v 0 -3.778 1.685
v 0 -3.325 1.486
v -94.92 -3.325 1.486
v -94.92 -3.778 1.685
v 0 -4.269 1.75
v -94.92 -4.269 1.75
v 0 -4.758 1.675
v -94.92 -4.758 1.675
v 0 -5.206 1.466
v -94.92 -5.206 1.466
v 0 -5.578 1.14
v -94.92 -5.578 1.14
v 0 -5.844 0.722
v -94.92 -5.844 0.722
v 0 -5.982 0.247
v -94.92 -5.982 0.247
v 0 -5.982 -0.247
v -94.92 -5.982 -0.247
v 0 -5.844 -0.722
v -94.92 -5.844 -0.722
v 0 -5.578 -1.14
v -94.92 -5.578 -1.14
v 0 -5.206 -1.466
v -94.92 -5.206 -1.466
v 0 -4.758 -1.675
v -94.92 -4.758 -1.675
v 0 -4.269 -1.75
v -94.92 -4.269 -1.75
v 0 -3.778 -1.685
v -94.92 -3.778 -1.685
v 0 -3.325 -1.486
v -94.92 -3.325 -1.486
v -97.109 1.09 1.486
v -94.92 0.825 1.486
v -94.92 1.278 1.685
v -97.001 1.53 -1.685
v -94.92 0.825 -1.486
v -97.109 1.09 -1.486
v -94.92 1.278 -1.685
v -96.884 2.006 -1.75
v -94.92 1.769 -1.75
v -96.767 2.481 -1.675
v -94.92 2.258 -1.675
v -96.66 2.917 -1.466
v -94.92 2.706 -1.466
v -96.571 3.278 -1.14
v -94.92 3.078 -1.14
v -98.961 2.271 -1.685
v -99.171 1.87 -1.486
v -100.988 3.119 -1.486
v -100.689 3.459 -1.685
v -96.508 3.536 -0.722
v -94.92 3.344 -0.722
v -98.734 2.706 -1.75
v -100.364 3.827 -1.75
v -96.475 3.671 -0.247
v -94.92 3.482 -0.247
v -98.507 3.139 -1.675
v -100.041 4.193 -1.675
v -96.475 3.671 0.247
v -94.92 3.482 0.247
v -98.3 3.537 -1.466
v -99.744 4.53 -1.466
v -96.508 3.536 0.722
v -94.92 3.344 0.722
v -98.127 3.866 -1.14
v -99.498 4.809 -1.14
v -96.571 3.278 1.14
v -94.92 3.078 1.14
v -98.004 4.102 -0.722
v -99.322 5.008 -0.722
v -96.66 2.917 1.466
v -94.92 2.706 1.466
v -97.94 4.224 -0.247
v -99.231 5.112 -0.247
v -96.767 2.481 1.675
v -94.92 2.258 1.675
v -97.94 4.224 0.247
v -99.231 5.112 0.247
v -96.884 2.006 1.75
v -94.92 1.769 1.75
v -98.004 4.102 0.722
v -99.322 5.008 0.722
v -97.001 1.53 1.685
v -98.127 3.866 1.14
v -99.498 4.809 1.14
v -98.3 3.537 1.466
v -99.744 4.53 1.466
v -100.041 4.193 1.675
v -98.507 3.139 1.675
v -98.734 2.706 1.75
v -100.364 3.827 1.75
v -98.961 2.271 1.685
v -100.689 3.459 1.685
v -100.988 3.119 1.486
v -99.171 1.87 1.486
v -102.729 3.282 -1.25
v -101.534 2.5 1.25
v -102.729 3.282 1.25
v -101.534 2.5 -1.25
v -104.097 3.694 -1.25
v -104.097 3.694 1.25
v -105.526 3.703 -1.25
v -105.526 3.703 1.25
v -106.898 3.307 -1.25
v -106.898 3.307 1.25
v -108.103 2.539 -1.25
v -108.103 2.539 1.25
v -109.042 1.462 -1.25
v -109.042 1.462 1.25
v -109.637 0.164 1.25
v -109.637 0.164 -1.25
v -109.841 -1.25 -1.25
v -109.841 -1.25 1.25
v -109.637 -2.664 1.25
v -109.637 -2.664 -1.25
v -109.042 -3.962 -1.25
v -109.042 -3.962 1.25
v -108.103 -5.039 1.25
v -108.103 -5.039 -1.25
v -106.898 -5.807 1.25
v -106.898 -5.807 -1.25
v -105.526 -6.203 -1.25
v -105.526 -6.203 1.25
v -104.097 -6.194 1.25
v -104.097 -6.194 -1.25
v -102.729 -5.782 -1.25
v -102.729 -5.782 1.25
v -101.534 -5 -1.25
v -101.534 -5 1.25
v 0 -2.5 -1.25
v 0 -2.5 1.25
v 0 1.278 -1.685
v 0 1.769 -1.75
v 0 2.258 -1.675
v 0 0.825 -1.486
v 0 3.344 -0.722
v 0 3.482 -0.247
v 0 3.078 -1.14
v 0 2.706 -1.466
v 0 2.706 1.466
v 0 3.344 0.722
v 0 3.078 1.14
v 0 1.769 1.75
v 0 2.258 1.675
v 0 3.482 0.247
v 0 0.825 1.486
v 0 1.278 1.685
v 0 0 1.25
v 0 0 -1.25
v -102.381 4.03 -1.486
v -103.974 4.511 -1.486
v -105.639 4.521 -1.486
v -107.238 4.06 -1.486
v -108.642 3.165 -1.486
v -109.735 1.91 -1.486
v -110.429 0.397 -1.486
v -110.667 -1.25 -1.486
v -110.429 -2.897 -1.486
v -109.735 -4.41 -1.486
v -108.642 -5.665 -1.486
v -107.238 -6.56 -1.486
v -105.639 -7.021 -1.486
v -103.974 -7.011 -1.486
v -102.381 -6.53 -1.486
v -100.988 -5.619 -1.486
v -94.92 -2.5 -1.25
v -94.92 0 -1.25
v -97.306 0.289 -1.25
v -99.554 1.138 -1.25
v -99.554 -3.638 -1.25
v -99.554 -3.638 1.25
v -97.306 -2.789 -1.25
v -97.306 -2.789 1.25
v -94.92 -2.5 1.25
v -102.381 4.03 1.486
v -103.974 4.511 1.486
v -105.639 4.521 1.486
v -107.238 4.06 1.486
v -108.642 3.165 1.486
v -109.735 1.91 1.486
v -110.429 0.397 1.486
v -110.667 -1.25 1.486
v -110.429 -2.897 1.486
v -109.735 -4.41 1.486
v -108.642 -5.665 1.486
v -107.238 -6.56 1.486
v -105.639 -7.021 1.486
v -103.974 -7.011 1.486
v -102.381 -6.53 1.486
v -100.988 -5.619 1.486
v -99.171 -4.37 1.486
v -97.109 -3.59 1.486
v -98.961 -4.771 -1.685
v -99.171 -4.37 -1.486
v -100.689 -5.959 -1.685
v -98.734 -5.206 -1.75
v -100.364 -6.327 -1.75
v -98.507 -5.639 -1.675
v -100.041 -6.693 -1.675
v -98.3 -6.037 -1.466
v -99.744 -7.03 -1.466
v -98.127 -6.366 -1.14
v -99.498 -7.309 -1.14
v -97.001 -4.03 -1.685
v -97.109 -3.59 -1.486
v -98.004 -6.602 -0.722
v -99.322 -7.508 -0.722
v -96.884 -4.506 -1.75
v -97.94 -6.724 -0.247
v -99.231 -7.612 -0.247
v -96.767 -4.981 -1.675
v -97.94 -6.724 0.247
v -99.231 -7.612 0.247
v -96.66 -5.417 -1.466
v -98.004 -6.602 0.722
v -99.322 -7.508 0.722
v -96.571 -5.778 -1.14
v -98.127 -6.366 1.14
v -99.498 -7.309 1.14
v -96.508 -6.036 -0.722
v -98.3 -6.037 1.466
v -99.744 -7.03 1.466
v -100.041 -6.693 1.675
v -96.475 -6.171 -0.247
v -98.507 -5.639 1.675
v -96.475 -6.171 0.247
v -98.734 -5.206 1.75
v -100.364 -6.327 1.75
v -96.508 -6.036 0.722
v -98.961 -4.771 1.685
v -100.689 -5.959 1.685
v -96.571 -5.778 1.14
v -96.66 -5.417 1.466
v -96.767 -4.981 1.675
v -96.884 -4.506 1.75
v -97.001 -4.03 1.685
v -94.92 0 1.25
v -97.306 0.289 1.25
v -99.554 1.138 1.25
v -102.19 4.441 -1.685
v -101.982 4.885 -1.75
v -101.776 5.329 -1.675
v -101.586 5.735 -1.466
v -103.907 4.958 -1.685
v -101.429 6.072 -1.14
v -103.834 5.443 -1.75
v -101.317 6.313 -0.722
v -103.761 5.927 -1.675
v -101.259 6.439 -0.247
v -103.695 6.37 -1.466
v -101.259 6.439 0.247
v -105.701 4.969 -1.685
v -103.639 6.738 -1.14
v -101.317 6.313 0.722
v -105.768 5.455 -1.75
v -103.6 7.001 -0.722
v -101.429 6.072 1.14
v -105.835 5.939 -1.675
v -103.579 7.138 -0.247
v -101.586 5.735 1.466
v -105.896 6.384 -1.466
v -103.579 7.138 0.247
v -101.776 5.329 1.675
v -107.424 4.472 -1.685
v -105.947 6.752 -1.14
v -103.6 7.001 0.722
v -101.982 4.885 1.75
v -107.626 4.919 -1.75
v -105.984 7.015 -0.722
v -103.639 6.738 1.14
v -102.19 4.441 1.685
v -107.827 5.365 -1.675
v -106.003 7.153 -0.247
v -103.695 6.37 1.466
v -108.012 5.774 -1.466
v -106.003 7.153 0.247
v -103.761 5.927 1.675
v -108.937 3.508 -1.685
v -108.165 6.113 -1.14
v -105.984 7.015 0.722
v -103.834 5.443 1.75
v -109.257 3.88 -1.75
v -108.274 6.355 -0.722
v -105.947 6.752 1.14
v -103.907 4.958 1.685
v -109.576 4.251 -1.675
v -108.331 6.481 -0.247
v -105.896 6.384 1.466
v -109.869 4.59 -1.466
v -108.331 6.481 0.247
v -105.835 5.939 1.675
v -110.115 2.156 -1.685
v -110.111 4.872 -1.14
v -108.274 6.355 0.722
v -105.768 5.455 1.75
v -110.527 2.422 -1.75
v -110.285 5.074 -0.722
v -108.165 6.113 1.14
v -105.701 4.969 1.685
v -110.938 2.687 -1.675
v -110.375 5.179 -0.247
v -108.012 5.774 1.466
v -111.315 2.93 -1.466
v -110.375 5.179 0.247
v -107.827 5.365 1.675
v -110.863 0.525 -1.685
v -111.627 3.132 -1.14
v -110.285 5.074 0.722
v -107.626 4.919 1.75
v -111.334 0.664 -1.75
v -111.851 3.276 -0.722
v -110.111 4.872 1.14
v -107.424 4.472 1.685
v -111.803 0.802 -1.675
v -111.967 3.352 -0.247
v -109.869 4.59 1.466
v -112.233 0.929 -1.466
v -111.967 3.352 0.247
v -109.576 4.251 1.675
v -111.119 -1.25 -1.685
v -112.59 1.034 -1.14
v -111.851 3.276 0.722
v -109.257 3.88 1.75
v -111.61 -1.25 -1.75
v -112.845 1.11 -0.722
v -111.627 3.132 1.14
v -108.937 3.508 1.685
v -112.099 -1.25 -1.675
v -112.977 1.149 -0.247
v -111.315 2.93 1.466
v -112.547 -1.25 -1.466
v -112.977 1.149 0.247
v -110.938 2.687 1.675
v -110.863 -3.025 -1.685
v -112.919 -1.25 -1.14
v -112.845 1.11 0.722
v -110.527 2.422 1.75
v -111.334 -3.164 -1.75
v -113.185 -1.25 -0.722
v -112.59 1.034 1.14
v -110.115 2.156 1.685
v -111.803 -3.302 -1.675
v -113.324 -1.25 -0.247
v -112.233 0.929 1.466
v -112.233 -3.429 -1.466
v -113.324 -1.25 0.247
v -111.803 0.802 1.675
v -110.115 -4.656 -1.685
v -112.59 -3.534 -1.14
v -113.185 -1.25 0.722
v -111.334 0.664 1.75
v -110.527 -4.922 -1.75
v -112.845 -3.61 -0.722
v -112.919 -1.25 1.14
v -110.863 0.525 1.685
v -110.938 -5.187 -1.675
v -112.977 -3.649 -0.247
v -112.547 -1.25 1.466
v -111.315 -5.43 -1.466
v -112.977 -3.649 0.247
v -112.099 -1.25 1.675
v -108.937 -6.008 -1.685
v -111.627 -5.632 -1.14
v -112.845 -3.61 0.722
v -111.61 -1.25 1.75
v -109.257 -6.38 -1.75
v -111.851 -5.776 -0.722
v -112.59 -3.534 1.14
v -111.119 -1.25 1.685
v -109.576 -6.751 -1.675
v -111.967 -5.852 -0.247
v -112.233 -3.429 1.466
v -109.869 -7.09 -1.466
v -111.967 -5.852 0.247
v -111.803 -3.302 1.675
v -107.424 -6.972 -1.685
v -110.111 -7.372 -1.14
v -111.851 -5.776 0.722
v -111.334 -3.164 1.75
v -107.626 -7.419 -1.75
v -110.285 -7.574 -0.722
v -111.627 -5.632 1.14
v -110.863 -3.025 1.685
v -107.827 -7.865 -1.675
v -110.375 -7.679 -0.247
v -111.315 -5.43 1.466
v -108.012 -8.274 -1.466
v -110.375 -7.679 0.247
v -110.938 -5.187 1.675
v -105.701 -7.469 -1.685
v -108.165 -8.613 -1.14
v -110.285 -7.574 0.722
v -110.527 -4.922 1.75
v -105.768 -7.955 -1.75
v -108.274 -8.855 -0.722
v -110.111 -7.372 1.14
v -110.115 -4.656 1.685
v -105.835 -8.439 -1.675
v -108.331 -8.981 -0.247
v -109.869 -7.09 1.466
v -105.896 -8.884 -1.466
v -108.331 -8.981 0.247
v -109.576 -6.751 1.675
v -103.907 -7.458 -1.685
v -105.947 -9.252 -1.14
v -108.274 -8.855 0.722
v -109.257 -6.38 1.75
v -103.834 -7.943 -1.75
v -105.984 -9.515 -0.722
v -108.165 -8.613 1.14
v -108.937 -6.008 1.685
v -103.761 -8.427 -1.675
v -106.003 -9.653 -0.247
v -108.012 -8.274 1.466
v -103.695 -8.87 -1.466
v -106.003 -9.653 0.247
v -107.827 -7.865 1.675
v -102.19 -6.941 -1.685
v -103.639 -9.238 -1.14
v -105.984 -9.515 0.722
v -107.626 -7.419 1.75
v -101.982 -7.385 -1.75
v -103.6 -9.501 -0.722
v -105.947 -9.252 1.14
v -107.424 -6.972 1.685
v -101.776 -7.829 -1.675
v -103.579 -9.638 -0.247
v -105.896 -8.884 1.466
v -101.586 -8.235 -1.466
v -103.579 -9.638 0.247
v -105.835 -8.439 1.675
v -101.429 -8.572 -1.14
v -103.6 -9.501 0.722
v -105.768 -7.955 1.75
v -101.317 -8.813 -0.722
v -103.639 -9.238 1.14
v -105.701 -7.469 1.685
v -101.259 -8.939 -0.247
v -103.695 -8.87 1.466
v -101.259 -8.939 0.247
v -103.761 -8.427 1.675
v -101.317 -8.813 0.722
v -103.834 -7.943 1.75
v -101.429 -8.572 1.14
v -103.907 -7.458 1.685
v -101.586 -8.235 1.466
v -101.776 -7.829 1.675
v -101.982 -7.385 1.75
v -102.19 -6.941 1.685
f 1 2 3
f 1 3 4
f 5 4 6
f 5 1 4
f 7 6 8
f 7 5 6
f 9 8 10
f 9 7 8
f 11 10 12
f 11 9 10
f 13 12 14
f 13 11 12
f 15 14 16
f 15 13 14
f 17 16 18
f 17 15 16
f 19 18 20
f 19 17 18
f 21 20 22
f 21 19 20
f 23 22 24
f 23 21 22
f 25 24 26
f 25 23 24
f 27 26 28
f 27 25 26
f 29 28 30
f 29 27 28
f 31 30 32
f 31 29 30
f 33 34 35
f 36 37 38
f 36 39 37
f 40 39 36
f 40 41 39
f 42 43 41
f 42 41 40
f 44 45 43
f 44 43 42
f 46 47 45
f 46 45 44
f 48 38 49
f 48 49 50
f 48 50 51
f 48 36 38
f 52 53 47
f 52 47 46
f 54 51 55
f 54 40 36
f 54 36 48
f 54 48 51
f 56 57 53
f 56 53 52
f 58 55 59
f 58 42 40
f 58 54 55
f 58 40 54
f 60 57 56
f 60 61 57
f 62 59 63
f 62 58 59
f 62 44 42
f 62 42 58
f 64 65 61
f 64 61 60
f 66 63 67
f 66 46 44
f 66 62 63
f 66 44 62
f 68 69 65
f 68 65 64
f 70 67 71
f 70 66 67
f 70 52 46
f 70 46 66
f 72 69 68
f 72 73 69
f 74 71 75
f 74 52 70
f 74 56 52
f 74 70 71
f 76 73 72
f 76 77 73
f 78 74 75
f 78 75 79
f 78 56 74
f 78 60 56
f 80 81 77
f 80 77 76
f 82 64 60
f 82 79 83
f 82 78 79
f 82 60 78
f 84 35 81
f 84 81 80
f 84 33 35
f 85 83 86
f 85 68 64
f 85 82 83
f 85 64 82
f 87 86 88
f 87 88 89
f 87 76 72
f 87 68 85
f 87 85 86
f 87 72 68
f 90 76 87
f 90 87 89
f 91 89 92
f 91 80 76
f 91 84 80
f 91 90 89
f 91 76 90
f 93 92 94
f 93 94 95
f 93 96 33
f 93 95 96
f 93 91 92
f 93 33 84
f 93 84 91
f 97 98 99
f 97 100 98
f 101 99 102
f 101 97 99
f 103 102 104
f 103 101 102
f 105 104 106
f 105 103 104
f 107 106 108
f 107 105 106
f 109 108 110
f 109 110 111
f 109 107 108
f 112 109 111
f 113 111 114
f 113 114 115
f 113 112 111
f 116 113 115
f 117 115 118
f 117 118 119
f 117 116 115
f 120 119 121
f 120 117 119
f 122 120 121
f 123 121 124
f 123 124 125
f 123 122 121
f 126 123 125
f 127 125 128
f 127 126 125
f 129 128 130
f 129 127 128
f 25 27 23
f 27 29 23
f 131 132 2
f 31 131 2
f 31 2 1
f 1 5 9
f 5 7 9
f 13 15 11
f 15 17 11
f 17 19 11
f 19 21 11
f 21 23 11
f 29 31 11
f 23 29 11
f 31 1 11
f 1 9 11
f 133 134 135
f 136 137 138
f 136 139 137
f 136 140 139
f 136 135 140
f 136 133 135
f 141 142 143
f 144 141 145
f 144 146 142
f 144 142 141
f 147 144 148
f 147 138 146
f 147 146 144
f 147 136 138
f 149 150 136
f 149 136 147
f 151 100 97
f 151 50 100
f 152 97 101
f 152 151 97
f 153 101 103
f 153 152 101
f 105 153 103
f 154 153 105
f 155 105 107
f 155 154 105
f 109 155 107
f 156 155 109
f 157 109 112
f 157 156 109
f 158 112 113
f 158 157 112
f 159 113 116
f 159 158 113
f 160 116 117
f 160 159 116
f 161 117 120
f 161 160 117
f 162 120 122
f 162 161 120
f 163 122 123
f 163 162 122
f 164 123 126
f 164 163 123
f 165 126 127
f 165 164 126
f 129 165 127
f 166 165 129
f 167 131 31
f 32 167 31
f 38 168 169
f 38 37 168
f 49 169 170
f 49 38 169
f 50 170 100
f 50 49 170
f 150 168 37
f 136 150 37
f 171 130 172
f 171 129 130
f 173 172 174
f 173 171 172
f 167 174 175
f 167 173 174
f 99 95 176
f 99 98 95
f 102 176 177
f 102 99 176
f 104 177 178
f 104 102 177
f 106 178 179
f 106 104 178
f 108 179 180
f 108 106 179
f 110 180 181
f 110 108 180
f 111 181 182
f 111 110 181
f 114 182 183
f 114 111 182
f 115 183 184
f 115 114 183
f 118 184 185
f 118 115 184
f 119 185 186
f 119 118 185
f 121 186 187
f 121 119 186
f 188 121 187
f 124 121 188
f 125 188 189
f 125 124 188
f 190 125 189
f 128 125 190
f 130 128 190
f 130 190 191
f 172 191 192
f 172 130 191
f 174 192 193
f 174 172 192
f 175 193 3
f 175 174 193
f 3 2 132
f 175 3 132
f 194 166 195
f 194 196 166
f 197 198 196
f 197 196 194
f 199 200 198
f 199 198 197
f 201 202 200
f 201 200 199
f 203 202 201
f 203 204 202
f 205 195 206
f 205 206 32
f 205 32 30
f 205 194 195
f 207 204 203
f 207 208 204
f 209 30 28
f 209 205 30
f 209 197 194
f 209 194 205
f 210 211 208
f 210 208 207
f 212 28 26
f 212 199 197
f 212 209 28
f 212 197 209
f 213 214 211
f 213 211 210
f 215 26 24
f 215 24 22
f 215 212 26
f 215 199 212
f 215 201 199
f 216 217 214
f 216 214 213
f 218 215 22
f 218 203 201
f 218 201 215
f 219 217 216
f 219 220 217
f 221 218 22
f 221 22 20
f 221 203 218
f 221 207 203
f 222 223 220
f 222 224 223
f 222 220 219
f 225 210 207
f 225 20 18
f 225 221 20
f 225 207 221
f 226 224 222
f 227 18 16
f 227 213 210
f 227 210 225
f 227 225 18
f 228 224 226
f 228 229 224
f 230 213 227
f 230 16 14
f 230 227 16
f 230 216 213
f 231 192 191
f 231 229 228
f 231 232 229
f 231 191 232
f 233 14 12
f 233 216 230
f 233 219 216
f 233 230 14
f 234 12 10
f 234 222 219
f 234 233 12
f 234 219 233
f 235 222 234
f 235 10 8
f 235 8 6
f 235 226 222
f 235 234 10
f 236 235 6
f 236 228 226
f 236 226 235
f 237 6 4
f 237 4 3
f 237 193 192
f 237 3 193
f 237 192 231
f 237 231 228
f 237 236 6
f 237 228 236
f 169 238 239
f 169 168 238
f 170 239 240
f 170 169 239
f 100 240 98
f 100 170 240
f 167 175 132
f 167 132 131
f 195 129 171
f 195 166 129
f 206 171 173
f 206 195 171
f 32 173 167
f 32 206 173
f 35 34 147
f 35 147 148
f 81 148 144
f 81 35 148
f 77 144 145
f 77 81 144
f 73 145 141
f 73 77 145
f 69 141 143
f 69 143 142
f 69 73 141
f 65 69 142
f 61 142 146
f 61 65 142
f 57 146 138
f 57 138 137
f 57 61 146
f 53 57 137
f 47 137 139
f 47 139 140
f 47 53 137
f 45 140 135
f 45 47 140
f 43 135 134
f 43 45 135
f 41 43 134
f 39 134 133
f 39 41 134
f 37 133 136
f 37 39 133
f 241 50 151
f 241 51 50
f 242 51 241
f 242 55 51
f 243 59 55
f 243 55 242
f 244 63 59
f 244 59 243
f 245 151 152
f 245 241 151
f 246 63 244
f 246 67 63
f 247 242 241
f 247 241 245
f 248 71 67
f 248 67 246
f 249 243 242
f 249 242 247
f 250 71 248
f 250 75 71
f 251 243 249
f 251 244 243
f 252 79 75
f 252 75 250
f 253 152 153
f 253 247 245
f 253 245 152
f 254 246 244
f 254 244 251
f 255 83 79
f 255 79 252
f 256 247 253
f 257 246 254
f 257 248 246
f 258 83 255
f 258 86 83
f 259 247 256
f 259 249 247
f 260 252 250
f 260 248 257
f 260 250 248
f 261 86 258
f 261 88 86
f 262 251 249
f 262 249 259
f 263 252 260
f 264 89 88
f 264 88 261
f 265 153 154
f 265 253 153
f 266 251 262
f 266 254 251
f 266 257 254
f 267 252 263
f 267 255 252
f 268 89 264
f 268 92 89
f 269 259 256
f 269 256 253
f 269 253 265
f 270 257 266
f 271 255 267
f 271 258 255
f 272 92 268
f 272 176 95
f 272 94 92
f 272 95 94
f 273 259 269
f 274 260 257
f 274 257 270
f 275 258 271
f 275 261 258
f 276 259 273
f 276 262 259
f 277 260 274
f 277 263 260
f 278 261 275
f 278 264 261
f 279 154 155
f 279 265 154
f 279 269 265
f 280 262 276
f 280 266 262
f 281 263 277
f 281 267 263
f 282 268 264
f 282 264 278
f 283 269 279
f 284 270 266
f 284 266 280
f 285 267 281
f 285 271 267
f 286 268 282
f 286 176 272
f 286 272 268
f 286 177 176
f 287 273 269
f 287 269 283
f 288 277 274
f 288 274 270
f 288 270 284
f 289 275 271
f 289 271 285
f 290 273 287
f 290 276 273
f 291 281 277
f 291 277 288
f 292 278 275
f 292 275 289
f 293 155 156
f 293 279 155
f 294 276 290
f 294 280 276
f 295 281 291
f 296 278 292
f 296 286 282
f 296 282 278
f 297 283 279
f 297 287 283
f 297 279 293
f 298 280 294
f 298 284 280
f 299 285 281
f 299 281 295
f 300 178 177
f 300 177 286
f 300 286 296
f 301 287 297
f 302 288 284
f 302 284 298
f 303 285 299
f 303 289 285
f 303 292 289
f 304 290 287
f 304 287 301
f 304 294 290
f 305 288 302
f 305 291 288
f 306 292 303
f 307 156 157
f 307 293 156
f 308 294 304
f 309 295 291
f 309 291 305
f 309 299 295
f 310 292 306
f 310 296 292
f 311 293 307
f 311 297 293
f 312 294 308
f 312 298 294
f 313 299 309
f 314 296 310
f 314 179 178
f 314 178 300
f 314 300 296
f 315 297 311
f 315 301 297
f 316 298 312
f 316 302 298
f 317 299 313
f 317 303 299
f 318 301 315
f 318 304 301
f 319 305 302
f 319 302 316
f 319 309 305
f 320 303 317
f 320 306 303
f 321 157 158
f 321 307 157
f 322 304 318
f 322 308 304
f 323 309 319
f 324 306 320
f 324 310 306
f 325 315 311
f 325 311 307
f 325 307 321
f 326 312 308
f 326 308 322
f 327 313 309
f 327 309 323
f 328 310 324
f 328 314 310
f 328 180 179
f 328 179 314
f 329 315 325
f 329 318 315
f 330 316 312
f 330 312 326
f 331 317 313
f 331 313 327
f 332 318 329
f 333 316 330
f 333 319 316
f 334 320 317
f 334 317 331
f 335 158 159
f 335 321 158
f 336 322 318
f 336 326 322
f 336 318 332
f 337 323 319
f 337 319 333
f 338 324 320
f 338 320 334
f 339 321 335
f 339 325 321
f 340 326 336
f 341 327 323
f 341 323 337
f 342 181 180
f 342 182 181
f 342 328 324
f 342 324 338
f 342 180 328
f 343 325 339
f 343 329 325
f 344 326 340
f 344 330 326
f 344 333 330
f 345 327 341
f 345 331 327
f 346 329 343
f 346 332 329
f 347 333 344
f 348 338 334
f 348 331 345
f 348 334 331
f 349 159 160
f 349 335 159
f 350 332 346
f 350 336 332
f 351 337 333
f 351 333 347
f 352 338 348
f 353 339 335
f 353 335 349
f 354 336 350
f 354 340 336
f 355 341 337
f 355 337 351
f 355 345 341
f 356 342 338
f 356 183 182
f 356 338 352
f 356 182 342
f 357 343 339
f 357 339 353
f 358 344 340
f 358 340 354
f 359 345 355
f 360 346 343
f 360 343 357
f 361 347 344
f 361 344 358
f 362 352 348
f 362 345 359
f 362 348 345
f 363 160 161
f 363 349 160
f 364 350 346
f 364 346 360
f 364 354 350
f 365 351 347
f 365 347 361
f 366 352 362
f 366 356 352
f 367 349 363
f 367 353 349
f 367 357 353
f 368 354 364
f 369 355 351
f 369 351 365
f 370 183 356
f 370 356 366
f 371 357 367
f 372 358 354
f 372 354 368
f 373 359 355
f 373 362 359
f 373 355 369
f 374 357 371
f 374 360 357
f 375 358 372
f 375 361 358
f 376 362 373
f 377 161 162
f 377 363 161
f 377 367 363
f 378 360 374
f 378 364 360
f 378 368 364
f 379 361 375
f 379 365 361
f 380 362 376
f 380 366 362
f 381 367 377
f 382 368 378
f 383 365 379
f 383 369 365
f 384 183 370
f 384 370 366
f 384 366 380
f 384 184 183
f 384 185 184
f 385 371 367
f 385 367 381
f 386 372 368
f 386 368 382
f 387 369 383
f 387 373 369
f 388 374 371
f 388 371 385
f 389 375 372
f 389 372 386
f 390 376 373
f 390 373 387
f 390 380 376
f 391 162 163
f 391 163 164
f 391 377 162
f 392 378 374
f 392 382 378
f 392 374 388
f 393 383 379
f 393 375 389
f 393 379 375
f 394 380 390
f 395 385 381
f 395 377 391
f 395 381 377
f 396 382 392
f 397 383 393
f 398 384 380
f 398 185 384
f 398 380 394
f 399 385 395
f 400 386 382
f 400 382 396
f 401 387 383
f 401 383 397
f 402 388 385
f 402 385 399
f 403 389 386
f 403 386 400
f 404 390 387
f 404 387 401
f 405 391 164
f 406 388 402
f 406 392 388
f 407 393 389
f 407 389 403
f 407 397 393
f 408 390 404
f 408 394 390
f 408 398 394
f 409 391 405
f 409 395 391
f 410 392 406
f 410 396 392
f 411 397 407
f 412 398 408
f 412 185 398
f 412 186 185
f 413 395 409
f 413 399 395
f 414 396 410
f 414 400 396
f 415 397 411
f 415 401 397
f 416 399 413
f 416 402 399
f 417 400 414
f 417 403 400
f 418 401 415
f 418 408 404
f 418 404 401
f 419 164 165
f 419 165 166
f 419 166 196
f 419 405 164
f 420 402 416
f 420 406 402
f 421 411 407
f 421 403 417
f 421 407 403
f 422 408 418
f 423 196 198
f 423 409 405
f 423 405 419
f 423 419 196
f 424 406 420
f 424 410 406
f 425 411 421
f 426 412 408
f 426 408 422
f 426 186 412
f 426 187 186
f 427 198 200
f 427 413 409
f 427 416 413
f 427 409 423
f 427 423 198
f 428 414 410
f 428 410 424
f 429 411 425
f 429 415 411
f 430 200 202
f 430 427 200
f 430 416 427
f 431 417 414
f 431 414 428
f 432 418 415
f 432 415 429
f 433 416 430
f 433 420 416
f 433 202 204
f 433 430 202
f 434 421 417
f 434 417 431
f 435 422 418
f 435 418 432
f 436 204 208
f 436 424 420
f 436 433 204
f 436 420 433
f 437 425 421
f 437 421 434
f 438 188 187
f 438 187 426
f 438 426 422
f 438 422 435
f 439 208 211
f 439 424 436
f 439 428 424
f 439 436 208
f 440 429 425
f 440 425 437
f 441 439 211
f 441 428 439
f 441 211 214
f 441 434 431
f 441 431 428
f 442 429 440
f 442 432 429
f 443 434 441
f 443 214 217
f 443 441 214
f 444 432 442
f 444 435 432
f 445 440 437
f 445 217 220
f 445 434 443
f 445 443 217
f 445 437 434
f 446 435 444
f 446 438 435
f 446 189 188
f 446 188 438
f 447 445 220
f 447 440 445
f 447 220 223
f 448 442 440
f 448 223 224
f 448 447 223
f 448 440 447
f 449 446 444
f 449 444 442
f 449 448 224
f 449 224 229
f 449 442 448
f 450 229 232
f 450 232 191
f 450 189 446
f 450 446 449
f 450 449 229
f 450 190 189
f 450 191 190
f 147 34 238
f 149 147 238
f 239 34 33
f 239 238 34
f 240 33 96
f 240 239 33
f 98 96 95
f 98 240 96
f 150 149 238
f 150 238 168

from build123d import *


with BuildPart() as part:
    # Sweep2: sweep along a path in Sketch1
    with BuildLine(Plane.XY) as sweep2_path:
        Line((0, 0), (-94.919661766, 0))
        ThreePointArc((-94.919661766, 0), (-98.455195672, 0.645856533), (-101.534040044, 2.5))
        ThreePointArc((-101.534040044, 2.5), (-109.841229183, -1.25), (-101.534040044, -5))
        ThreePointArc((-101.534040044, -5), (-98.455195672, -3.145856533), (-94.919661766, -2.5))
        Line((-94.919661766, -2.5), (0, -2.5))
    # Sketch2 → Sweep2 (sweep)
    with BuildSketch(Plane(origin=(0, 0, 0), x_dir=(0, 0, -1), z_dir=(1, 0, 0))):
        with BuildLine():
            Line((-1.25, 0), (1.25, 0))
            Line((1.25, 0), (1.485849057, 0.825471698))
            ThreePointArc((1.485849057, 0.825471698), (0, 3.5), (-1.485849057, 0.825471698))
            Line((-1.485849057, 0.825471698), (-1.25, 0))
        make_face()
    sweep(path=sweep2_path.line)


solid = part.part
